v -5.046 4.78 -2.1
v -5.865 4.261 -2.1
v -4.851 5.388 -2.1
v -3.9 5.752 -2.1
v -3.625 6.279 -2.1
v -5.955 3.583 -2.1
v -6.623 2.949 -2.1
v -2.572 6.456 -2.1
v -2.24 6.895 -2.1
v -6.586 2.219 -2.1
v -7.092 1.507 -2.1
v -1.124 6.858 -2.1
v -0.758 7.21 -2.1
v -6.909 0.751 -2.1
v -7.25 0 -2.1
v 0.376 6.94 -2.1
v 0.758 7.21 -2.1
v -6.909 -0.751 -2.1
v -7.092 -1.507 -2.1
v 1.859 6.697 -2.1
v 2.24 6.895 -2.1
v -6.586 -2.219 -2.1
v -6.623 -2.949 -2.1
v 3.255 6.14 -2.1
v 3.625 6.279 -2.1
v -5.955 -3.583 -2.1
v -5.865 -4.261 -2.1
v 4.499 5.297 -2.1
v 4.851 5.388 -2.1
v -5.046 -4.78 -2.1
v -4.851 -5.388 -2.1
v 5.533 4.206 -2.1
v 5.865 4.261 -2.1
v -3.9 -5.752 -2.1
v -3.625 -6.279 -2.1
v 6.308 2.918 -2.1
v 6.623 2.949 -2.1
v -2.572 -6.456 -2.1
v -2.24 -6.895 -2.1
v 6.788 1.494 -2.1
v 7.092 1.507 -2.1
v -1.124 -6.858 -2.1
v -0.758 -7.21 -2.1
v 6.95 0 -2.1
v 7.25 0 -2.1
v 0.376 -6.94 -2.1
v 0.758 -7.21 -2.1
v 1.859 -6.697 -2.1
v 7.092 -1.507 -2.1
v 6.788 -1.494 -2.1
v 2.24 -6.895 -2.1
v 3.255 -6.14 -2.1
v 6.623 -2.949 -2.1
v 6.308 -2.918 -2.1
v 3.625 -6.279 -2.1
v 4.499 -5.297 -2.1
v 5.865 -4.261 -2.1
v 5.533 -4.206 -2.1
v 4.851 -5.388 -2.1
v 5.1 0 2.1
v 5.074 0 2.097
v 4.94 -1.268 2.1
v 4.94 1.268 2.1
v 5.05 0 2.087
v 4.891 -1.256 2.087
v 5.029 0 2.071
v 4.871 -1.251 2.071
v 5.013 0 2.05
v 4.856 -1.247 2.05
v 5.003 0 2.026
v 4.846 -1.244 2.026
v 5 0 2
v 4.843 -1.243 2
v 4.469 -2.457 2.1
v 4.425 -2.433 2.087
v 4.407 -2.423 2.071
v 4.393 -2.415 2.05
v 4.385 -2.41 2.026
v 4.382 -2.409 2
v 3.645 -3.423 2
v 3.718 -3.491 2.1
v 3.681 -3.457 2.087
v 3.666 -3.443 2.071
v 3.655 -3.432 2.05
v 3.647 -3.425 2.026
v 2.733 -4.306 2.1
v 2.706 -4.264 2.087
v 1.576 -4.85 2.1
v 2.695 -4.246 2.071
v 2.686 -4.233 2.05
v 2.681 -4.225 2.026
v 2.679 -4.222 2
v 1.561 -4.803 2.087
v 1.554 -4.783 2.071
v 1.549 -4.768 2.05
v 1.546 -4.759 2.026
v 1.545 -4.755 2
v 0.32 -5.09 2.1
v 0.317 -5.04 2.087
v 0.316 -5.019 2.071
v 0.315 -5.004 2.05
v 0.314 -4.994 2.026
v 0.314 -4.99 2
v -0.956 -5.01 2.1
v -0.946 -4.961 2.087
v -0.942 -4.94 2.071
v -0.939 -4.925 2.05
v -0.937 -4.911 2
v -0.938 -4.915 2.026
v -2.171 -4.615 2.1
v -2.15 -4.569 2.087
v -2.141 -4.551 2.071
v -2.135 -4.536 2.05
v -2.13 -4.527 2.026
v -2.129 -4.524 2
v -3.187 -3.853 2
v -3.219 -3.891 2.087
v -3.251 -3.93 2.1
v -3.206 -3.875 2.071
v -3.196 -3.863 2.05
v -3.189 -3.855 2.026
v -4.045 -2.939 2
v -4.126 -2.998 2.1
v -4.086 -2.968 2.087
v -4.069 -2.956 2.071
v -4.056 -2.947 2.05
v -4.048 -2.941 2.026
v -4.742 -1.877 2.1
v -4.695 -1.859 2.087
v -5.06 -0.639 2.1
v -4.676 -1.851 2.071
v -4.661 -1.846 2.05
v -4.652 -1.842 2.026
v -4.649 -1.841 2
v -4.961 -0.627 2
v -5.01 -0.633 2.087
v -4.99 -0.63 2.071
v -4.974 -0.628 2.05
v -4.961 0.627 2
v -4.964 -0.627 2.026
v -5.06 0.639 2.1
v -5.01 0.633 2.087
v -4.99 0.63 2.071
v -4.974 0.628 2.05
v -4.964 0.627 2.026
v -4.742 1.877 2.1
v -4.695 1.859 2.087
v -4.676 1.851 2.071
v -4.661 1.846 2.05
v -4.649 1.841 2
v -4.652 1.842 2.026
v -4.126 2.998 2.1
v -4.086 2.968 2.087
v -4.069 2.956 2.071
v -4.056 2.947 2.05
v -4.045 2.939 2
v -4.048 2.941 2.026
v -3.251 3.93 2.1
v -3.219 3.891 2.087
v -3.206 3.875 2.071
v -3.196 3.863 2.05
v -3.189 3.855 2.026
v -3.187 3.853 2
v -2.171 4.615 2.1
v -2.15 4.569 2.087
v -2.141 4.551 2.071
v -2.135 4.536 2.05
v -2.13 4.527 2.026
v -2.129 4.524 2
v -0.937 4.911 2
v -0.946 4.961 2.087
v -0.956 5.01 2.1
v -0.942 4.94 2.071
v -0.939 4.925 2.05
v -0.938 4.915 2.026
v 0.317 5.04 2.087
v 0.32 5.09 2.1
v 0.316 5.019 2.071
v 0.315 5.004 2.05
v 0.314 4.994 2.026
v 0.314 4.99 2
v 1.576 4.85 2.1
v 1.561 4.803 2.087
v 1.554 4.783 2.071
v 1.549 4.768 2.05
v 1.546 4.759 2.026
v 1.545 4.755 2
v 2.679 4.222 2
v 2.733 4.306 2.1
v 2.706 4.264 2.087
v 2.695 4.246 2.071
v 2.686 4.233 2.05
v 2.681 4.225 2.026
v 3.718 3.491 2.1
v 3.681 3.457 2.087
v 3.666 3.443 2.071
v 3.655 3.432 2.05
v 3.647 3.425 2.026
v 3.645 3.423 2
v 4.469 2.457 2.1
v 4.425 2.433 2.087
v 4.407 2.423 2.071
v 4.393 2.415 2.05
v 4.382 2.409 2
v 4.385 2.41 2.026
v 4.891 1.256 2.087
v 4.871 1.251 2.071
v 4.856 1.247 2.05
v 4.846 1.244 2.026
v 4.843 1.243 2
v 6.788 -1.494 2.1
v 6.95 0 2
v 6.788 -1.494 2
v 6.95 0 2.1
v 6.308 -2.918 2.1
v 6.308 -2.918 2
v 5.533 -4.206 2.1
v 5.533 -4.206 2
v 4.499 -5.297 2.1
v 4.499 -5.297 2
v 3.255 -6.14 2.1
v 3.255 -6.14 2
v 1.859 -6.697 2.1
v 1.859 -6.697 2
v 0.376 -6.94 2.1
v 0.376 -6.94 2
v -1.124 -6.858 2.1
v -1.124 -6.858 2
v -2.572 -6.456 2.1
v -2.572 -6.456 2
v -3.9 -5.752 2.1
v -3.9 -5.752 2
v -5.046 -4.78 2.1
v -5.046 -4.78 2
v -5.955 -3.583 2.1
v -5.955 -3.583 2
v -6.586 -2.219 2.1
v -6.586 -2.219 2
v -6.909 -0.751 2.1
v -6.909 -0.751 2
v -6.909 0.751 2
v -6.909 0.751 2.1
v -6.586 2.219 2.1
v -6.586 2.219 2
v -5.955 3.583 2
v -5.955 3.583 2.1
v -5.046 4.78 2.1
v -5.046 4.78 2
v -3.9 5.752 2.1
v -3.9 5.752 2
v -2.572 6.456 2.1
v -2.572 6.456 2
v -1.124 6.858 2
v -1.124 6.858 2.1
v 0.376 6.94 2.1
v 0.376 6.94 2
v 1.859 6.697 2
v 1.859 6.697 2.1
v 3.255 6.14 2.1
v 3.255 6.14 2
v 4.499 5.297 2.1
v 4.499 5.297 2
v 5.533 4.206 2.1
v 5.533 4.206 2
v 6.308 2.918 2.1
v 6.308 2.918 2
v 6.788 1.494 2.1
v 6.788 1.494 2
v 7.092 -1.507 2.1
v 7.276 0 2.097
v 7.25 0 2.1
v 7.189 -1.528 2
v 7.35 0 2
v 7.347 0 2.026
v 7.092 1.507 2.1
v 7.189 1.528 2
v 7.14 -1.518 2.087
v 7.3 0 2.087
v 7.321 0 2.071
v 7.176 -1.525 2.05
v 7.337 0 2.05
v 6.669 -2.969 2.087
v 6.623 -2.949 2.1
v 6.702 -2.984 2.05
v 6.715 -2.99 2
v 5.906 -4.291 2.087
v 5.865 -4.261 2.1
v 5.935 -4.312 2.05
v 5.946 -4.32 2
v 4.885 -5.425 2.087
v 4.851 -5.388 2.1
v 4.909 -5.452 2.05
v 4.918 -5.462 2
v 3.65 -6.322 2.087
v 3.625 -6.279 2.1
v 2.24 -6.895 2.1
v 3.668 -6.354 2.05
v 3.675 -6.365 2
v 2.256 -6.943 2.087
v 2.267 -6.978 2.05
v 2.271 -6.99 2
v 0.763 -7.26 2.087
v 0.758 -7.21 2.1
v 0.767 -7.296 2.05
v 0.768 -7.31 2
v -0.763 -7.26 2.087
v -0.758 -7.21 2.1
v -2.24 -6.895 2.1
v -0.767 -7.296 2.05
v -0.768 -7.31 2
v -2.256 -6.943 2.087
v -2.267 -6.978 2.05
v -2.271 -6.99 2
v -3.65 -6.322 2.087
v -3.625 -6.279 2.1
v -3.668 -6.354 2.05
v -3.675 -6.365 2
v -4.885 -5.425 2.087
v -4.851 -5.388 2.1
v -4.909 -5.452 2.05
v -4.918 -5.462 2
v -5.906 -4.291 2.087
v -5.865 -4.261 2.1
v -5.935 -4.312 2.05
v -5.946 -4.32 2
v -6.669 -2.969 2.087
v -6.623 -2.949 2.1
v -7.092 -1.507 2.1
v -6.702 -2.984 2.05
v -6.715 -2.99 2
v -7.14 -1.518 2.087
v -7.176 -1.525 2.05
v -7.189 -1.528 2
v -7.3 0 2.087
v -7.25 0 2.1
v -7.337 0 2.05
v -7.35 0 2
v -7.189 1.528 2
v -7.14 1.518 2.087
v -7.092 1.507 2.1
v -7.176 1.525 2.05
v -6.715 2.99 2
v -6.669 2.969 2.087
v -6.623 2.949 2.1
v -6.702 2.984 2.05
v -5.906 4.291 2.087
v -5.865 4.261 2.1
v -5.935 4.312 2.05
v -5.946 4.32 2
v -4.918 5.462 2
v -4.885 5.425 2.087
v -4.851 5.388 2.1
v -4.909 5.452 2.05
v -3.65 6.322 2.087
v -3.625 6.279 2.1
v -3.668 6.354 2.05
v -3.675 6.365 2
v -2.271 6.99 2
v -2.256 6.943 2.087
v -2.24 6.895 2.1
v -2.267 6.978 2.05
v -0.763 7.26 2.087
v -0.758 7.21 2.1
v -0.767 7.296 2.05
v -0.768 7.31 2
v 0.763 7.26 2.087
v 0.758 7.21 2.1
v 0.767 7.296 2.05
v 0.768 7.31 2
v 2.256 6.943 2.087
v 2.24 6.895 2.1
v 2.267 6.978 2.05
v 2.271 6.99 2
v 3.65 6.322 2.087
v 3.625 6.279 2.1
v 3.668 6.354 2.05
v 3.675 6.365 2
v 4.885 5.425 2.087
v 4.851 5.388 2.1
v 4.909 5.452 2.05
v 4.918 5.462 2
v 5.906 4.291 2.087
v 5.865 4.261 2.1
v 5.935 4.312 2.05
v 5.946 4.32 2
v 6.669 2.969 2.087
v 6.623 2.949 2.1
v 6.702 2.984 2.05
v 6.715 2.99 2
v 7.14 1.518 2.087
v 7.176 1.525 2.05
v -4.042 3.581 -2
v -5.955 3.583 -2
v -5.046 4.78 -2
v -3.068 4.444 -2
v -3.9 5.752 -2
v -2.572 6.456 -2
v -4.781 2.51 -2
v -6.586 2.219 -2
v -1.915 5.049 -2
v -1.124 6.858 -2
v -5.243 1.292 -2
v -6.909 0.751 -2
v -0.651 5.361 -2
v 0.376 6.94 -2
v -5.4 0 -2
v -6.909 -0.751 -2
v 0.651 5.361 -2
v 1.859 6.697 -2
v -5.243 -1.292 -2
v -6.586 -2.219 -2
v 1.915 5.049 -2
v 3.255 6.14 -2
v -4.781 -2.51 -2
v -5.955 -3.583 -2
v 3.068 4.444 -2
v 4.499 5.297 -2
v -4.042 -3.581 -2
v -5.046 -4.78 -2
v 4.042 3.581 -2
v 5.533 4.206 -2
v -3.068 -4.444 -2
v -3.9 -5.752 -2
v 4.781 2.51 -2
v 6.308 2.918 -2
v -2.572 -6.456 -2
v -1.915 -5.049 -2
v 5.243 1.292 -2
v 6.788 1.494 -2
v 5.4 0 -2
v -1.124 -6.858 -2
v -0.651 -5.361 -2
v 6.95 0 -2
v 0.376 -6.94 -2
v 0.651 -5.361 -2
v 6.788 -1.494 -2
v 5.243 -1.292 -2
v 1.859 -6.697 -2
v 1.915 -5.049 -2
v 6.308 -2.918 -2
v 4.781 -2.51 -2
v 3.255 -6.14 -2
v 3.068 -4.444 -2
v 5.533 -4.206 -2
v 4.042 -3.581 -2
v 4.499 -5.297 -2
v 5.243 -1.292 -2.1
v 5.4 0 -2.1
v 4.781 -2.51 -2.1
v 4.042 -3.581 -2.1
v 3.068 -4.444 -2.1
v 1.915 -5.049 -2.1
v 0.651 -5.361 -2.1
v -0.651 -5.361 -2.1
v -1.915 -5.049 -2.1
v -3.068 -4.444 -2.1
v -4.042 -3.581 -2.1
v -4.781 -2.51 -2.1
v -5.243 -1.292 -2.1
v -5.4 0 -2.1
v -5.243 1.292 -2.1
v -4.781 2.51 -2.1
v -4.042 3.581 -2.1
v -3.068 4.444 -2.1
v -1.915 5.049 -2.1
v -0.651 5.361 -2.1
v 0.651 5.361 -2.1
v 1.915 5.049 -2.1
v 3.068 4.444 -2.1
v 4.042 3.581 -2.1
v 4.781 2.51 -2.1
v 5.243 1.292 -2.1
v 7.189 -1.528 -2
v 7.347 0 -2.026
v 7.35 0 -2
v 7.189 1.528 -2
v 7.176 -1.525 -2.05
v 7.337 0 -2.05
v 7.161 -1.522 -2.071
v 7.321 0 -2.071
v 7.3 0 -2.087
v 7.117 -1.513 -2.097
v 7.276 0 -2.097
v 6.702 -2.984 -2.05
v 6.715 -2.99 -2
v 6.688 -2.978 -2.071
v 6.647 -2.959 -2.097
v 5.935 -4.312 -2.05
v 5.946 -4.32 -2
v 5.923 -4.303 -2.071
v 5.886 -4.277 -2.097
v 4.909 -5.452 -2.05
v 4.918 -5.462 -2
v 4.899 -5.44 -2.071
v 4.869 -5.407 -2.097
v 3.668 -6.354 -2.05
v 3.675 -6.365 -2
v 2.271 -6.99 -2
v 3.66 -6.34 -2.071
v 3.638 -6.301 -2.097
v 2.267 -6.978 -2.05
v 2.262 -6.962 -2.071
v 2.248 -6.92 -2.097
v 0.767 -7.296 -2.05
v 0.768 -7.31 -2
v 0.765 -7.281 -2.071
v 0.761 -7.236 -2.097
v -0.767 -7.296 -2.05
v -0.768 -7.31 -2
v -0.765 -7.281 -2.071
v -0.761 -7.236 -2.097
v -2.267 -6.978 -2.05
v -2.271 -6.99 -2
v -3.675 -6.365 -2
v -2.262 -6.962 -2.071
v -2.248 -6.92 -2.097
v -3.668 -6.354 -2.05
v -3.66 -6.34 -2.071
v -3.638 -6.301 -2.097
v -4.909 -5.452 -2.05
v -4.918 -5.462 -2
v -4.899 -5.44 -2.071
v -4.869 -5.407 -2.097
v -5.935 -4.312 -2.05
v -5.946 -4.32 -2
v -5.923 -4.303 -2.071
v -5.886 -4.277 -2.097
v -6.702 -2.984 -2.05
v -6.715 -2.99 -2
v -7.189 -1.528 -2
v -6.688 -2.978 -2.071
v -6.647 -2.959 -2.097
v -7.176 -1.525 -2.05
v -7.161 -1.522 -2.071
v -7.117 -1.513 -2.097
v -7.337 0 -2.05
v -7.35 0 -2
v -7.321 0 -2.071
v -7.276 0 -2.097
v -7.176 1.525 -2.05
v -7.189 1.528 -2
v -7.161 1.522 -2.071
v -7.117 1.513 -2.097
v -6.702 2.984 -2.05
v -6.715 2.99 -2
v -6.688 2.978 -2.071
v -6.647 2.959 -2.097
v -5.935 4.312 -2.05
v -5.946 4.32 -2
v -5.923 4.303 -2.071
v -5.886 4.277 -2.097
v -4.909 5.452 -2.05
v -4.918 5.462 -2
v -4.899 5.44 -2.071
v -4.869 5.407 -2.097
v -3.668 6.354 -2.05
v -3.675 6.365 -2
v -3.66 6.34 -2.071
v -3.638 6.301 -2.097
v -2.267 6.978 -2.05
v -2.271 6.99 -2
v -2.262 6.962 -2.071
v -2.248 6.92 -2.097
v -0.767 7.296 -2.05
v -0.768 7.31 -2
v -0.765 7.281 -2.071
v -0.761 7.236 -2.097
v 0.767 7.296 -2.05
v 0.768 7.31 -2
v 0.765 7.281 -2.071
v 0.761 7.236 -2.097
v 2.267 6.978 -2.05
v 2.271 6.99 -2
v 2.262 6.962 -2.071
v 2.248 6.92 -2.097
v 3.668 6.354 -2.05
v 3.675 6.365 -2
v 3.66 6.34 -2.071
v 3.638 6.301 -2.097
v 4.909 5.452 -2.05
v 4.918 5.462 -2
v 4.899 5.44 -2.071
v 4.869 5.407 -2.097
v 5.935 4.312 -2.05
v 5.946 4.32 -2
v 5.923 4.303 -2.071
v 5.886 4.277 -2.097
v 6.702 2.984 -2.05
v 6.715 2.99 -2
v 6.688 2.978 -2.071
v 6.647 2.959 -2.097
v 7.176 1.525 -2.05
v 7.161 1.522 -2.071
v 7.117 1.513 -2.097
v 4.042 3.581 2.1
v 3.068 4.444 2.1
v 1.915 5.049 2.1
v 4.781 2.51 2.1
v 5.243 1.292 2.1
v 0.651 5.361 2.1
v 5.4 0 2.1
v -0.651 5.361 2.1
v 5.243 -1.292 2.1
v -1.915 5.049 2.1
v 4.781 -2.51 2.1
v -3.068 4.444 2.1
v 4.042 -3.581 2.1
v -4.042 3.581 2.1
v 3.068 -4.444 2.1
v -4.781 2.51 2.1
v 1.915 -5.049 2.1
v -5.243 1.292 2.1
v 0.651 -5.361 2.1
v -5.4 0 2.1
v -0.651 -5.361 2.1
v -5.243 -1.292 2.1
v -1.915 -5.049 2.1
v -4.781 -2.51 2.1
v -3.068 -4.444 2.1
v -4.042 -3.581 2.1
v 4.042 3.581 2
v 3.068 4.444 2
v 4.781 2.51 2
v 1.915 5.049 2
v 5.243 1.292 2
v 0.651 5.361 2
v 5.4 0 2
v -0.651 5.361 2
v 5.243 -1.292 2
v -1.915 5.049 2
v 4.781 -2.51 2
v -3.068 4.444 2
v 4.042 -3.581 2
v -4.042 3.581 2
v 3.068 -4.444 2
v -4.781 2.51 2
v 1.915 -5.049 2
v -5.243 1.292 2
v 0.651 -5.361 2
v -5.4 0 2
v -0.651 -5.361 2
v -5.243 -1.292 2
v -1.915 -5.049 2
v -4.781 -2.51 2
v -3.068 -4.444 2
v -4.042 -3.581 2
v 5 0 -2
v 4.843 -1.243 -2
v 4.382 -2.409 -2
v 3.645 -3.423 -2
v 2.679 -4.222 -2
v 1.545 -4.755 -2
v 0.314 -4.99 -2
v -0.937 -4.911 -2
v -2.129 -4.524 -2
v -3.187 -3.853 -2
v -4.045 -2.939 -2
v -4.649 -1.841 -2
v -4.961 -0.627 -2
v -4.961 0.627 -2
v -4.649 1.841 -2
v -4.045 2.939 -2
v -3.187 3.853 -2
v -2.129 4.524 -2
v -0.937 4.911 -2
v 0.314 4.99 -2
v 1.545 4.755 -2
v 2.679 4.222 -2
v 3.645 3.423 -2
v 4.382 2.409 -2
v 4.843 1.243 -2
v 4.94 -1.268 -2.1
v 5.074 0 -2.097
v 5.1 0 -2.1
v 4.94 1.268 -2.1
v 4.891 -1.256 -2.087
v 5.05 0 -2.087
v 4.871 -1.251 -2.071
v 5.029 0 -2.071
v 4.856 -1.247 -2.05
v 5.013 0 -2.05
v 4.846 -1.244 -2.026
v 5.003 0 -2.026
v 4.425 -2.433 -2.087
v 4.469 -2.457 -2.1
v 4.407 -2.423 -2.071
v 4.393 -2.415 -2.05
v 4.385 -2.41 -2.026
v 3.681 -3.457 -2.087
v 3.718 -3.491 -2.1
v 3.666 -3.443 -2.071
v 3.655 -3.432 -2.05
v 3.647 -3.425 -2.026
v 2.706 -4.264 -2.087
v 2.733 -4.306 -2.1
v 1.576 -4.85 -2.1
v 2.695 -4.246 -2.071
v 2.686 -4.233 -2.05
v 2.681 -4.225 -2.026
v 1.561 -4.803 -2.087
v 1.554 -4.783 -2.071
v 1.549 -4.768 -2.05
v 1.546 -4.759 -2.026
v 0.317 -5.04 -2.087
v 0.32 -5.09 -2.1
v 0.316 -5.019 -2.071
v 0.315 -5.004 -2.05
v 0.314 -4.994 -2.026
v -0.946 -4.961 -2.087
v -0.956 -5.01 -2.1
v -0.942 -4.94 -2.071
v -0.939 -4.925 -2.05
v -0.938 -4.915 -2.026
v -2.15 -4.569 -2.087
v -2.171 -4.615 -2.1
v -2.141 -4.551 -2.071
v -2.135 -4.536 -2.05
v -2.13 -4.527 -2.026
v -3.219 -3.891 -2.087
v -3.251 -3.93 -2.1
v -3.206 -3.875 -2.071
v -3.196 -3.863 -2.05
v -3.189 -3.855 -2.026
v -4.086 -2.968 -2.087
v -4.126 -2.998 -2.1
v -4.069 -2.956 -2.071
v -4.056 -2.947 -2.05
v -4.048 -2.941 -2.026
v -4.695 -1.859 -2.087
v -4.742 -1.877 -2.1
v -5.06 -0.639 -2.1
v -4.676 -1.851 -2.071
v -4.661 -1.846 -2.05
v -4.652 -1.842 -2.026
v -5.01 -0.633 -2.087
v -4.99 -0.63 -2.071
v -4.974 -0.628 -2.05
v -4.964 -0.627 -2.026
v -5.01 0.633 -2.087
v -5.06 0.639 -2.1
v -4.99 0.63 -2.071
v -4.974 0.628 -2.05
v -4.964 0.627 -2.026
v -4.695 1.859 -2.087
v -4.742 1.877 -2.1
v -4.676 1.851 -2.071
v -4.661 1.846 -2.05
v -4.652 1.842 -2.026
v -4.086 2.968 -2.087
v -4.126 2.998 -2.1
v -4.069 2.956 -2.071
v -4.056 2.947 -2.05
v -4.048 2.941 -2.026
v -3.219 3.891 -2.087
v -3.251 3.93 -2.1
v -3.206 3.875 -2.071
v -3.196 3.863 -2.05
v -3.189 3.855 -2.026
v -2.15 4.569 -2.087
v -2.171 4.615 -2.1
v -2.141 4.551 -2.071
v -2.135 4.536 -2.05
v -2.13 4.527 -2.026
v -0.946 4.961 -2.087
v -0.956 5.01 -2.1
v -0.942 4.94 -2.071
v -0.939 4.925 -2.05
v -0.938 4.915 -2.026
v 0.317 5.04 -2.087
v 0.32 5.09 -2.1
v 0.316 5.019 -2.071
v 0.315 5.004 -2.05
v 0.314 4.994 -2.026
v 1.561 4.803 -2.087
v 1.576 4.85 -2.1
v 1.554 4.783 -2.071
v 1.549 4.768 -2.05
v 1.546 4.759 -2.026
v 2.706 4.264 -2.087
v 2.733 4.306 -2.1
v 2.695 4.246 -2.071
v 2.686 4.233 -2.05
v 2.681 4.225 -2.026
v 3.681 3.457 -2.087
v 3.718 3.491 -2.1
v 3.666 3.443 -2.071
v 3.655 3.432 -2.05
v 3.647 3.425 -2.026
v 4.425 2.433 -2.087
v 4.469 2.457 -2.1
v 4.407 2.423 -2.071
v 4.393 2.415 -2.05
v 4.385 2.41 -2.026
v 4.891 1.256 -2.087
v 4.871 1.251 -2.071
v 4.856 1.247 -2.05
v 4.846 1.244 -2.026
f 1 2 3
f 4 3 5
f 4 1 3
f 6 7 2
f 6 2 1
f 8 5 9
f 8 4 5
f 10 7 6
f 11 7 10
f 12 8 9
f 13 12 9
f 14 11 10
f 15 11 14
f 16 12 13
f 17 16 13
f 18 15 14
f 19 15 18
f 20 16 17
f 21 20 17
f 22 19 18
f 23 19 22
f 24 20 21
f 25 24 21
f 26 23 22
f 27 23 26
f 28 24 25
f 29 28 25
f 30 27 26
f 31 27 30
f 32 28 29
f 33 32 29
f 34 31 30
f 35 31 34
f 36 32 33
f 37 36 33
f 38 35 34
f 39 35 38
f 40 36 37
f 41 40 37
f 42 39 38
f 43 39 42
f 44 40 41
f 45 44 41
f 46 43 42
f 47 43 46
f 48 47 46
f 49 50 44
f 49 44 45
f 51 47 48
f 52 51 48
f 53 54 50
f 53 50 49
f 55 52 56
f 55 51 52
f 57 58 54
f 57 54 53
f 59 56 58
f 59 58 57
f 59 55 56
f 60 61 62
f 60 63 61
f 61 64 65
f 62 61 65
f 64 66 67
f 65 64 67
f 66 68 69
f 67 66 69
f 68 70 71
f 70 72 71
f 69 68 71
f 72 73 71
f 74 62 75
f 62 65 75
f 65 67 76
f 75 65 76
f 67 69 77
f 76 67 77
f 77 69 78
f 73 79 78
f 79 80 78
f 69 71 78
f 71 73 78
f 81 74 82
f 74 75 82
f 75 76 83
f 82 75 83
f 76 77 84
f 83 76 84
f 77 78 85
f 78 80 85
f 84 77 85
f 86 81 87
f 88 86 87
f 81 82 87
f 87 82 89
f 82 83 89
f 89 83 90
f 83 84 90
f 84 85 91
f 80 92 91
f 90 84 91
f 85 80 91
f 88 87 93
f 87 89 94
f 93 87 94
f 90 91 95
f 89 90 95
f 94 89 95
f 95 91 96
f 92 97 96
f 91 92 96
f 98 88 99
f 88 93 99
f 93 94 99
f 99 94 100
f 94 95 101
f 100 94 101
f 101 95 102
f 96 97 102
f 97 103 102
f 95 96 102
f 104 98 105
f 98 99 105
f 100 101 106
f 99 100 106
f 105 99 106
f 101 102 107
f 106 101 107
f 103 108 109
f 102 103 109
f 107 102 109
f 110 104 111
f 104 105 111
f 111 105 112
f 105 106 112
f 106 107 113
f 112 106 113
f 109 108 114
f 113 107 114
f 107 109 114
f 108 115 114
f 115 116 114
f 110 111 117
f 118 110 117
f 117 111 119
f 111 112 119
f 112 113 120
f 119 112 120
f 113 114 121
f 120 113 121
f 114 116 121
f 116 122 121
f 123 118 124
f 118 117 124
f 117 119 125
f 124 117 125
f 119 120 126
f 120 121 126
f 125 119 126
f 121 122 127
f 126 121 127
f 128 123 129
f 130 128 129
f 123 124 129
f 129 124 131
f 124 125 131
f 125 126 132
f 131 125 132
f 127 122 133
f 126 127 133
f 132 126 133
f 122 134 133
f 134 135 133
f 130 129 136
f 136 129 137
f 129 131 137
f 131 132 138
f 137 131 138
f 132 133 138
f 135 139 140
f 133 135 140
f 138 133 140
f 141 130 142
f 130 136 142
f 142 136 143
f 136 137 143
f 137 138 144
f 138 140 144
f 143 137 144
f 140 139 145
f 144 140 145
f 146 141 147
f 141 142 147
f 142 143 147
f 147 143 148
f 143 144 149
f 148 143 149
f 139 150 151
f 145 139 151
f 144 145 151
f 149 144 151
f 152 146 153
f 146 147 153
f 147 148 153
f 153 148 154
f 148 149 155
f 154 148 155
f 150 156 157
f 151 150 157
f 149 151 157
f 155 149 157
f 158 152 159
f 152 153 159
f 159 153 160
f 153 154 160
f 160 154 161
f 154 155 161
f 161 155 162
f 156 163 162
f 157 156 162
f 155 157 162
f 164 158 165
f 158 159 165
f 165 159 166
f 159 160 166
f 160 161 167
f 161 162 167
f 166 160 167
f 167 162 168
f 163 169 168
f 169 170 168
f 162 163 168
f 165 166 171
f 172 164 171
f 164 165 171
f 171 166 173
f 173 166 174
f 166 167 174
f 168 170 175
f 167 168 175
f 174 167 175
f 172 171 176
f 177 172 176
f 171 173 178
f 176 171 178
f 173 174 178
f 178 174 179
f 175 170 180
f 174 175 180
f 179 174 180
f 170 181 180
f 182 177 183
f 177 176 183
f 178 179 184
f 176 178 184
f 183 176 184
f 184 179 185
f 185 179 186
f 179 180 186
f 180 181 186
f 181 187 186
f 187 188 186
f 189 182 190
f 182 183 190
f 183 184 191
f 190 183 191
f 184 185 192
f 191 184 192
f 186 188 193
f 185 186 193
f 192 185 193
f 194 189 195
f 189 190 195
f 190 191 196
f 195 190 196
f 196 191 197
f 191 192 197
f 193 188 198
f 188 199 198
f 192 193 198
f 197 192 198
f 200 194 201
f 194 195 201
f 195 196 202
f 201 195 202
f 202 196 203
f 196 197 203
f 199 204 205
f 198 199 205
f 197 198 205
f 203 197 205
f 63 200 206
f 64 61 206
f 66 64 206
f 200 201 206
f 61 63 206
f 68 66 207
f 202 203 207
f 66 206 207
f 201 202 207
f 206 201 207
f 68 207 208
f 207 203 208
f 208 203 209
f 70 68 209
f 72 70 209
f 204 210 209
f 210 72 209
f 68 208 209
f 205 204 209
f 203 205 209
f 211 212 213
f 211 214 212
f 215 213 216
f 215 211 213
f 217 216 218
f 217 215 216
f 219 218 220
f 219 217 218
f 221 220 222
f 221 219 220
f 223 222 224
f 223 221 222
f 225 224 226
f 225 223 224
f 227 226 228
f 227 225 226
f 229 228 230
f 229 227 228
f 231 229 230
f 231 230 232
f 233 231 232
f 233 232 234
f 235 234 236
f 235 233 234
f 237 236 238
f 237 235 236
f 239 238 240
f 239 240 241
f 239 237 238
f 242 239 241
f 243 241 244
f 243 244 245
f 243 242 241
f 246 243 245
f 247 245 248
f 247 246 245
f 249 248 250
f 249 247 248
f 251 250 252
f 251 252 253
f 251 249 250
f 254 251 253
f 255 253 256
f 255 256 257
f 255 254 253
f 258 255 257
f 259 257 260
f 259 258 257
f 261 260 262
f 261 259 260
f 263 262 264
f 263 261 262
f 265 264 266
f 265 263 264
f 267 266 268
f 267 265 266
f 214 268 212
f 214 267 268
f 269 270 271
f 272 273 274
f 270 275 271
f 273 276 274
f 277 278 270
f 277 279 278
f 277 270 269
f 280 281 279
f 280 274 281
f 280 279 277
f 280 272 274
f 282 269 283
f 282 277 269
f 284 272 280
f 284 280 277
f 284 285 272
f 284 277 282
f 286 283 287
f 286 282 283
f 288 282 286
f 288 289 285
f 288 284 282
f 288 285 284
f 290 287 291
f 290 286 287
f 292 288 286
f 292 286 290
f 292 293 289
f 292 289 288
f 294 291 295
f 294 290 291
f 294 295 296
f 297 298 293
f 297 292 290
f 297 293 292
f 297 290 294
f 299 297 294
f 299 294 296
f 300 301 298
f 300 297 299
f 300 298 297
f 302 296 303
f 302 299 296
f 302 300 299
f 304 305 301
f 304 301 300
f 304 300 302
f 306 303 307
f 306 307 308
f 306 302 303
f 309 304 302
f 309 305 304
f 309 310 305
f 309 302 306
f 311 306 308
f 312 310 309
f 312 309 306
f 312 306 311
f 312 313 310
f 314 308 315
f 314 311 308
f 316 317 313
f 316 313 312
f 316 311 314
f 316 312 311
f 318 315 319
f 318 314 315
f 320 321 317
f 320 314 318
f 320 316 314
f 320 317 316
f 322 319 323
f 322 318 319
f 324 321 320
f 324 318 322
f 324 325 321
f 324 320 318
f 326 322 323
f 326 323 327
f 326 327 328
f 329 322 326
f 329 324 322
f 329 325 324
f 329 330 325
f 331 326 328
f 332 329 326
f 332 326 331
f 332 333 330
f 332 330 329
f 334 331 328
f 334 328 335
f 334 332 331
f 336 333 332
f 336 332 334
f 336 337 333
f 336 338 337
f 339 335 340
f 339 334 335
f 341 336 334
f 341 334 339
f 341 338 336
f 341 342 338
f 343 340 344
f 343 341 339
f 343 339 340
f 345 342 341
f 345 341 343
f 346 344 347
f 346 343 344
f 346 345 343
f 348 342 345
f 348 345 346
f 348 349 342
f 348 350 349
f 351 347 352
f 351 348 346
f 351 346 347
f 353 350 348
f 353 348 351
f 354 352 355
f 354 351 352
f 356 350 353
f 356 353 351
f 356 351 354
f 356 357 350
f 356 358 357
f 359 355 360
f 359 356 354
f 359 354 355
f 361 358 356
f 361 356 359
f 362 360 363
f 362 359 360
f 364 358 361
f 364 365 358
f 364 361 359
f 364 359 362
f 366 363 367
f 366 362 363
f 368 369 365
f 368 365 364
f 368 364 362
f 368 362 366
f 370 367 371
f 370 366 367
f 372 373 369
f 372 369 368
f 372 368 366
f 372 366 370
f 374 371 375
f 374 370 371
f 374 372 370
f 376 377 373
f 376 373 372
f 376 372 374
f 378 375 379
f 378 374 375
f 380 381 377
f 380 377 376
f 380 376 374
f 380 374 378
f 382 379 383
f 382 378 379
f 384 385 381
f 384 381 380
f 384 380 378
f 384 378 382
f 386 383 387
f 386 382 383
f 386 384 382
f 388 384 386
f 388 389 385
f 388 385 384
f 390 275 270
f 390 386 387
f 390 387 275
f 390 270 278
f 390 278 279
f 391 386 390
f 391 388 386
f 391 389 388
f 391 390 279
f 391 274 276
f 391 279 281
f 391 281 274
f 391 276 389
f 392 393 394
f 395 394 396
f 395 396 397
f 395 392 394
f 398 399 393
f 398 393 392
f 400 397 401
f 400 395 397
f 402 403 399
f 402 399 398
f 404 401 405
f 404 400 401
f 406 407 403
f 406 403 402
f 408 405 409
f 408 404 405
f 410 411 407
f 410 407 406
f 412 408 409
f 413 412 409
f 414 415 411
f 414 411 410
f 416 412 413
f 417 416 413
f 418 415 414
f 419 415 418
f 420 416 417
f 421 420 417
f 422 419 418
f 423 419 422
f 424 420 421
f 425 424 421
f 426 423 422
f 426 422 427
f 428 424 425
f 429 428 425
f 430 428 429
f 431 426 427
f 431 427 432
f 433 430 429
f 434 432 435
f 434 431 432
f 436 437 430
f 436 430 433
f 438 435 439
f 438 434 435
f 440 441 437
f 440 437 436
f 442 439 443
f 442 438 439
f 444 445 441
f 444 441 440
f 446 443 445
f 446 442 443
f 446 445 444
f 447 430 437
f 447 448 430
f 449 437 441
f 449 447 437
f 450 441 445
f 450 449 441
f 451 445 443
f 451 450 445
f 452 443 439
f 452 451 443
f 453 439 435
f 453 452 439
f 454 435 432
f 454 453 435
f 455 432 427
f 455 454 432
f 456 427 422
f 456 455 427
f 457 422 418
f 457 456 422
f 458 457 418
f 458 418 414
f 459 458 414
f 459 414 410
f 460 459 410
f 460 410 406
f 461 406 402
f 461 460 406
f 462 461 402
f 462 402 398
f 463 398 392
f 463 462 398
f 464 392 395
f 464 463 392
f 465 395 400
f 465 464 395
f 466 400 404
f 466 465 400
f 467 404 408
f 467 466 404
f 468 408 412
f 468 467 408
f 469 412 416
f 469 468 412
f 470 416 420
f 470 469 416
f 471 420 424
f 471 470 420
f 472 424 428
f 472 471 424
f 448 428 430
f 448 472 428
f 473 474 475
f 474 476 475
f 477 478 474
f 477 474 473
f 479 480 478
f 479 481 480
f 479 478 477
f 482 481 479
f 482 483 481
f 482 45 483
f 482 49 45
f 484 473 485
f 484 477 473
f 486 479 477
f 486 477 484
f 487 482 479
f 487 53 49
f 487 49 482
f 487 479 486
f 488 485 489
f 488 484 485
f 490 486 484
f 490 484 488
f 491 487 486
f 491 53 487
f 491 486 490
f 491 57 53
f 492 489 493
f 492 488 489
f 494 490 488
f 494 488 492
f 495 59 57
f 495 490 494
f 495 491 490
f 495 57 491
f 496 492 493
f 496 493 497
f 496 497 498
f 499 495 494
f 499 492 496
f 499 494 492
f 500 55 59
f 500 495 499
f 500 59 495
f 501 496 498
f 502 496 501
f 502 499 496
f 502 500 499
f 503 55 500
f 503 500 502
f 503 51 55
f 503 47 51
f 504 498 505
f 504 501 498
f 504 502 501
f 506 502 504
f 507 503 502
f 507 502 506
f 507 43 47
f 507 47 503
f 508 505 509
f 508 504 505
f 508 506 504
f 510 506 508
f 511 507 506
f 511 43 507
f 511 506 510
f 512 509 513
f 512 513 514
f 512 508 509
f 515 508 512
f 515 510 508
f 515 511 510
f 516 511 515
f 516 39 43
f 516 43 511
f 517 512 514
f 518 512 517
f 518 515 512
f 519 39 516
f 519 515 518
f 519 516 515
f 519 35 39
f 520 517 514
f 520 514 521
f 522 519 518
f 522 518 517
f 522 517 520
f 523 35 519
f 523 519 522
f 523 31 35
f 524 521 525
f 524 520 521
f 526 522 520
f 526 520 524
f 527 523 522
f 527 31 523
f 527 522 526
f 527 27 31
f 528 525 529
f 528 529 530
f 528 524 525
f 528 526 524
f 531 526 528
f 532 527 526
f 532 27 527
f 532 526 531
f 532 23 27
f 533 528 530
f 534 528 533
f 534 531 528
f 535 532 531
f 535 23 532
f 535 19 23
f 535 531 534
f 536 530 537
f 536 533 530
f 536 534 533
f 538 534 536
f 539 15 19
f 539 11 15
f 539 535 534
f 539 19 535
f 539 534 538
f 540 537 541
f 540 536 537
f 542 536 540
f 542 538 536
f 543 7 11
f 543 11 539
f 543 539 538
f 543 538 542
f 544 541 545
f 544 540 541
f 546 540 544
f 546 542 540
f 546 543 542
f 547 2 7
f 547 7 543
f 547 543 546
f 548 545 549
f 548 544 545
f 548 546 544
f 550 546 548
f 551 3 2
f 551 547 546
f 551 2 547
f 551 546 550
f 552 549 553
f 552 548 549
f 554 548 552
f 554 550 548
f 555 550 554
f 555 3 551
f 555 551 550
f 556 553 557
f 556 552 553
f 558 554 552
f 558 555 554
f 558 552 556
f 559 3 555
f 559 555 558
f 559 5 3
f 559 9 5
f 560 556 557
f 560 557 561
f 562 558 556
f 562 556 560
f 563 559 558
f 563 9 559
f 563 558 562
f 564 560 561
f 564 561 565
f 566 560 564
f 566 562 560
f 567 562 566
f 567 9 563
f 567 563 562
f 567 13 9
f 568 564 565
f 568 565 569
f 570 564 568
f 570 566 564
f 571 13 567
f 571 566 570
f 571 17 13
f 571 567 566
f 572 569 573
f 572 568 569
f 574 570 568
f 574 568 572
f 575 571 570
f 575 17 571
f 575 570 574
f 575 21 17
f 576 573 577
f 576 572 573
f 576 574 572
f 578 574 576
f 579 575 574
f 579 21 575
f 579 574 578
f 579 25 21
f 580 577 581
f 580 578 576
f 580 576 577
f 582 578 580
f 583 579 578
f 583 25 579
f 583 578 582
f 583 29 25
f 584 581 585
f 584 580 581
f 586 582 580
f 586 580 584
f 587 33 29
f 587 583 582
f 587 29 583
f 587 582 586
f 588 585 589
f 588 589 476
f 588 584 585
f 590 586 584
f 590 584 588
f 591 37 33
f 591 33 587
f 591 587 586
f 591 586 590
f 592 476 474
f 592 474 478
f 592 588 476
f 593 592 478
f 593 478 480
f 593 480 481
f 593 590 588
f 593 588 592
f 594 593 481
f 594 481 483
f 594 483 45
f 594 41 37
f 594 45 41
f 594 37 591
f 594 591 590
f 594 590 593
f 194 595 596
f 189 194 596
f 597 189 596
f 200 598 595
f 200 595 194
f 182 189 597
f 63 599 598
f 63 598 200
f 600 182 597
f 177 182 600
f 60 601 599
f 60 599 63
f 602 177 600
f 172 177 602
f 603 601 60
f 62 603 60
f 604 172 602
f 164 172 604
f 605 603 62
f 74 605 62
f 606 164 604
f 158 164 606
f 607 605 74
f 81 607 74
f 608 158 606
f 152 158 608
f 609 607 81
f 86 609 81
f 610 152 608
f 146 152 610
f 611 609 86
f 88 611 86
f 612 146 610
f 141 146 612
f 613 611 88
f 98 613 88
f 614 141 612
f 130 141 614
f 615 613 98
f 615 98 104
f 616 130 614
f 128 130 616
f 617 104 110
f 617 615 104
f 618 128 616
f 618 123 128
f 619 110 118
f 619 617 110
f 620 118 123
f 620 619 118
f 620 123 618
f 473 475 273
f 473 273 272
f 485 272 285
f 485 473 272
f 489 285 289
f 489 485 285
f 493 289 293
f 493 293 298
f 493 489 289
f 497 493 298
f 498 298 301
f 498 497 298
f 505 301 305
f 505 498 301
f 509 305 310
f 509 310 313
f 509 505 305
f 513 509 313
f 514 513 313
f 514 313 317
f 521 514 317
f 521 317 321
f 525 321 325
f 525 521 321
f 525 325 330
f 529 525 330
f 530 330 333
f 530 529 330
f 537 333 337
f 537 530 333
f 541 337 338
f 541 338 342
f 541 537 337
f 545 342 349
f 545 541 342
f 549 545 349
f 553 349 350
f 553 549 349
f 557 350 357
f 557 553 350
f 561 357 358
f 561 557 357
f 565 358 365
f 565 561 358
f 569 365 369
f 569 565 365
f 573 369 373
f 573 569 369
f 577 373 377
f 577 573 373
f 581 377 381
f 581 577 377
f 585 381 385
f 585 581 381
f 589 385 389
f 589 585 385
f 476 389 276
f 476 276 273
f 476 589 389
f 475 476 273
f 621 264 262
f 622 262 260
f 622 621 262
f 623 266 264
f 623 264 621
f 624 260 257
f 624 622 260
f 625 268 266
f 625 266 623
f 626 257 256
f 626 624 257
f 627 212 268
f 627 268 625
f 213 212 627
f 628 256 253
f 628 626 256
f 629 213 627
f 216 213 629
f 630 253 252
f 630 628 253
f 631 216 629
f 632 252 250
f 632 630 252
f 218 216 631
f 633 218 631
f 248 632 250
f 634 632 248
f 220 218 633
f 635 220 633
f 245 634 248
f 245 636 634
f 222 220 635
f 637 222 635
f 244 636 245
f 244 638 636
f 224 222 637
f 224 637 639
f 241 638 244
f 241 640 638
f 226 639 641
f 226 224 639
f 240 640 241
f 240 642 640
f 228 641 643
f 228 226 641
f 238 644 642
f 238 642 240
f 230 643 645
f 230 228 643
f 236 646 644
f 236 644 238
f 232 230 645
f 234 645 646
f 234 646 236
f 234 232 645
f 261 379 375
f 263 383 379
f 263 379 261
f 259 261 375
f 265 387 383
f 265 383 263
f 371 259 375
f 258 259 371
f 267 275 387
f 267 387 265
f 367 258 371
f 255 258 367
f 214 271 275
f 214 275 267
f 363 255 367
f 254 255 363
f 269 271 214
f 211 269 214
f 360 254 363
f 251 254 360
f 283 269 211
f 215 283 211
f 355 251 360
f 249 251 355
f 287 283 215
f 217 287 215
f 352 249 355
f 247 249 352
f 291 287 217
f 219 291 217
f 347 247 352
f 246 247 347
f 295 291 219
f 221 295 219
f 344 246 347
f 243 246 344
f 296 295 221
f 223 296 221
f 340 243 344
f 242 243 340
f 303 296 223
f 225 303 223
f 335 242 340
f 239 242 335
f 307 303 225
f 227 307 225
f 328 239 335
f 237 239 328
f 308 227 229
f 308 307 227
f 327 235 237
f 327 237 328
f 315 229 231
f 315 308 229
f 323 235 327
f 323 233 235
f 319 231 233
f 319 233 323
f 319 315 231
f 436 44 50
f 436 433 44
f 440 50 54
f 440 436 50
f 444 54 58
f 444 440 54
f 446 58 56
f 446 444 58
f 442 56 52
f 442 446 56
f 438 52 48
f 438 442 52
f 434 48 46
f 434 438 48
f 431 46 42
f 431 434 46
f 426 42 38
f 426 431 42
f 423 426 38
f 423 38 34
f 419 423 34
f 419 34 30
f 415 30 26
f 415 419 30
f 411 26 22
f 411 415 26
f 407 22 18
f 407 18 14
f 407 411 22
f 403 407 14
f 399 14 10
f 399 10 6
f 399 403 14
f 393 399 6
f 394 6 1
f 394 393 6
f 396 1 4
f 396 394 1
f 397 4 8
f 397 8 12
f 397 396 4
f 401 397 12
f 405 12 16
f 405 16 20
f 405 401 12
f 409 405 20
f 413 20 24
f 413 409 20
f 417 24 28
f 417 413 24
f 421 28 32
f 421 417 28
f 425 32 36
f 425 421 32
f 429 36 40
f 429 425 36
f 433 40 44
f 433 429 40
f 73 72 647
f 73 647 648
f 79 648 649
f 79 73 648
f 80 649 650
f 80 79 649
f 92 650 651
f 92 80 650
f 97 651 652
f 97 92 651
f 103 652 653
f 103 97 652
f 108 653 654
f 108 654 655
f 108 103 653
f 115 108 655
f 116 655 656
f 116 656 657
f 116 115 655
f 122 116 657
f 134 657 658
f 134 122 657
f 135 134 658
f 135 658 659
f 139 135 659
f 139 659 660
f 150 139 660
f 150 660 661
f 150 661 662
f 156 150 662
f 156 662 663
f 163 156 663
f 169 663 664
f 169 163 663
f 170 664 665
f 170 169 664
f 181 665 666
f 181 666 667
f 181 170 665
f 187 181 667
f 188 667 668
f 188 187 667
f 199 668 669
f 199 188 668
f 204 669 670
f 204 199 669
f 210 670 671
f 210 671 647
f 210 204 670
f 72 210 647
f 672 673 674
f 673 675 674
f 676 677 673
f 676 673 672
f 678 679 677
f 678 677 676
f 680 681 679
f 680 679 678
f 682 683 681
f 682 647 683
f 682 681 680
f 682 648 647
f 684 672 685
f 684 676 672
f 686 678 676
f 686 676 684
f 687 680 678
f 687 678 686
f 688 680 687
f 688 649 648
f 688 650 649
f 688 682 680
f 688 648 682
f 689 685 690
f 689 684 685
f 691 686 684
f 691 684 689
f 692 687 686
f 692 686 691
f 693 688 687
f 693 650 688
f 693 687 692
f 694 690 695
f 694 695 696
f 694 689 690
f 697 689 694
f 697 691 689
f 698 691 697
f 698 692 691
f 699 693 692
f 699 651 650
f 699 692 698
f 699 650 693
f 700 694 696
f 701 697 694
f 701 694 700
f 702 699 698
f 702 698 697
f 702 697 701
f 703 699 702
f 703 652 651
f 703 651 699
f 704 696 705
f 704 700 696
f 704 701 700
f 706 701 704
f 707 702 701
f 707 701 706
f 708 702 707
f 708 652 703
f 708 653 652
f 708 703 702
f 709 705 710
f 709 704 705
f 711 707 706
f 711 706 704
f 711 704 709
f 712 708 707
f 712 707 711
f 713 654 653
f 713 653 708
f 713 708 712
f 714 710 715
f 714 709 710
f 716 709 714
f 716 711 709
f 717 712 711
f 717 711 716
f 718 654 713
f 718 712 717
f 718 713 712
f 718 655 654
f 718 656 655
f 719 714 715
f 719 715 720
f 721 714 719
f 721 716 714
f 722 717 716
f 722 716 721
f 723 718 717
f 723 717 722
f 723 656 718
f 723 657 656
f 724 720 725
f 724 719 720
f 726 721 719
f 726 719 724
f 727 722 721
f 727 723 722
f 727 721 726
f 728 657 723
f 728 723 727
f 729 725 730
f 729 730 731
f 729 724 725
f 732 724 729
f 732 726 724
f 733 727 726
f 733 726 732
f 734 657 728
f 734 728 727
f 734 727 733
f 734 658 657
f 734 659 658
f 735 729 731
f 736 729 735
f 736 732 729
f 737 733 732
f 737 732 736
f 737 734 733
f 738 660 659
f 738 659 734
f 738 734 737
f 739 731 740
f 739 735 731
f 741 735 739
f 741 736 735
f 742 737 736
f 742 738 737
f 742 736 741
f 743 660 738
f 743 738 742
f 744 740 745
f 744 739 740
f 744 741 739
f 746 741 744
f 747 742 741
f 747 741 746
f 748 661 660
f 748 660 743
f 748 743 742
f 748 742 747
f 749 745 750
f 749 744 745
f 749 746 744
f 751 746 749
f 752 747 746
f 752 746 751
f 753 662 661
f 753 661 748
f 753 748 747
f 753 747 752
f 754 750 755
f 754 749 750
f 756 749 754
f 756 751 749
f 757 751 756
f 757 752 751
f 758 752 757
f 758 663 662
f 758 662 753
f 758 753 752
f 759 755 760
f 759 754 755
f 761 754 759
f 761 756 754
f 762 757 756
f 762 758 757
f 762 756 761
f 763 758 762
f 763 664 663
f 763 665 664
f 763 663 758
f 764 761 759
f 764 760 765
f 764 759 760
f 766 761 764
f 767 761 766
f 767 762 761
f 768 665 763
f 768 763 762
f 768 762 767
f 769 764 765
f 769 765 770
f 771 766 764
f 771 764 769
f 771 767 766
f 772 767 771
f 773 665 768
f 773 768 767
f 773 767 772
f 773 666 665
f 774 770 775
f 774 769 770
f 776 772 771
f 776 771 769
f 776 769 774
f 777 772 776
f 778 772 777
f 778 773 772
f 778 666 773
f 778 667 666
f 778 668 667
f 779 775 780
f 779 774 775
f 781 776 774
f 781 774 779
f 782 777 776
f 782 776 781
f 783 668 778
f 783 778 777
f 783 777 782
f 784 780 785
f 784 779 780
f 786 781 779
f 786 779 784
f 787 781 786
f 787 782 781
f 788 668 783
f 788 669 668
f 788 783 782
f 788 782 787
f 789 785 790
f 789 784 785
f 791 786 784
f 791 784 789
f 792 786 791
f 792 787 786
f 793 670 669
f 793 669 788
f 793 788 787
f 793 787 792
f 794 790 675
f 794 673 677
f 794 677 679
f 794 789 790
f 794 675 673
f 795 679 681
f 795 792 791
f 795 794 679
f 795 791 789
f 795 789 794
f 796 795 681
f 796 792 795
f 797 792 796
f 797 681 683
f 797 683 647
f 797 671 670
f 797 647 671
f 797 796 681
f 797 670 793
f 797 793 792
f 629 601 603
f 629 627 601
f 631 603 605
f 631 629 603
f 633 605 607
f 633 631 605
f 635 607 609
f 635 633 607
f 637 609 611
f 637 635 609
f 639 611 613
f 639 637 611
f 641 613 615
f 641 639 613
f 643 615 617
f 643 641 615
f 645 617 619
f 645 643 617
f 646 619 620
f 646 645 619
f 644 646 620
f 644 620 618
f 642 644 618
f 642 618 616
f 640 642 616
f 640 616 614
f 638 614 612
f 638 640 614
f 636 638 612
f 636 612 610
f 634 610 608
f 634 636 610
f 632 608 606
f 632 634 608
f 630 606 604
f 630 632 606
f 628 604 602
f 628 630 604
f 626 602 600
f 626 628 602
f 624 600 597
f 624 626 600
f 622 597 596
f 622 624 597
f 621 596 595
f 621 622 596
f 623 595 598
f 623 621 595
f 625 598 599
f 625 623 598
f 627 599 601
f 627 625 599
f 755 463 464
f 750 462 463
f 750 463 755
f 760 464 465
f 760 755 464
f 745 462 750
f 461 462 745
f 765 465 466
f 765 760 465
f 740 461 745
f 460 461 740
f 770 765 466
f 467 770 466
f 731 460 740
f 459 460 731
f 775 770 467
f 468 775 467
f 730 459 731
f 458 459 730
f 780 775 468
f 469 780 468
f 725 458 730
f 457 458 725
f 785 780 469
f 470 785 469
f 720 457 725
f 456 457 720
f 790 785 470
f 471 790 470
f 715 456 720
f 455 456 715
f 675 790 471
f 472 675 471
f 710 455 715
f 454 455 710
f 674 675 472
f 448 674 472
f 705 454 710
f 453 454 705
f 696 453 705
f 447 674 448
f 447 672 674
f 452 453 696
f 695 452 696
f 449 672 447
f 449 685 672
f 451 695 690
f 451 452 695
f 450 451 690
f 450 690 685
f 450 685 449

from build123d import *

# Parameters (mm, degrees)
FILLET1_R = 0.1


with BuildPart() as part:
    # Sketch1 → Revolve1 (revolve)
    with BuildSketch(Plane(origin=(0, 0, 0), x_dir=(0, 0, -1), z_dir=(1, 0, 0)), mode=Mode.PRIVATE) as revolve1_sk:
        Polygon((-2.1, 5), (-2.1, 5.4), (-2, 5.4), (-2, 6.95), (-2.1, 6.95), (-2.1, 7.35), (2.1, 7.35), (2.1, 6.95), (2, 6.95), (2, 5.4), (2.1, 5.4), (2.1, 5), align=None)
    revolve(revolve1_sk.sketch.rotate(Axis((0, 0, 14.88), (0, 0, -1)), 90), axis=Axis((0, 0, 14.88), (0, 0, -1)))

    # Fillet1
    fillet1_edges = [part.edges().sort_by_distance(p)[0] for p in [
        (-7.35, 0, 2.1),
        (-7.35, 0, -2.1),
        (-5, 0, -2.1),
        (-5, 0, 2.1),
    ]]
    fillet(fillet1_edges, radius=FILLET1_R)


solid = part.part
